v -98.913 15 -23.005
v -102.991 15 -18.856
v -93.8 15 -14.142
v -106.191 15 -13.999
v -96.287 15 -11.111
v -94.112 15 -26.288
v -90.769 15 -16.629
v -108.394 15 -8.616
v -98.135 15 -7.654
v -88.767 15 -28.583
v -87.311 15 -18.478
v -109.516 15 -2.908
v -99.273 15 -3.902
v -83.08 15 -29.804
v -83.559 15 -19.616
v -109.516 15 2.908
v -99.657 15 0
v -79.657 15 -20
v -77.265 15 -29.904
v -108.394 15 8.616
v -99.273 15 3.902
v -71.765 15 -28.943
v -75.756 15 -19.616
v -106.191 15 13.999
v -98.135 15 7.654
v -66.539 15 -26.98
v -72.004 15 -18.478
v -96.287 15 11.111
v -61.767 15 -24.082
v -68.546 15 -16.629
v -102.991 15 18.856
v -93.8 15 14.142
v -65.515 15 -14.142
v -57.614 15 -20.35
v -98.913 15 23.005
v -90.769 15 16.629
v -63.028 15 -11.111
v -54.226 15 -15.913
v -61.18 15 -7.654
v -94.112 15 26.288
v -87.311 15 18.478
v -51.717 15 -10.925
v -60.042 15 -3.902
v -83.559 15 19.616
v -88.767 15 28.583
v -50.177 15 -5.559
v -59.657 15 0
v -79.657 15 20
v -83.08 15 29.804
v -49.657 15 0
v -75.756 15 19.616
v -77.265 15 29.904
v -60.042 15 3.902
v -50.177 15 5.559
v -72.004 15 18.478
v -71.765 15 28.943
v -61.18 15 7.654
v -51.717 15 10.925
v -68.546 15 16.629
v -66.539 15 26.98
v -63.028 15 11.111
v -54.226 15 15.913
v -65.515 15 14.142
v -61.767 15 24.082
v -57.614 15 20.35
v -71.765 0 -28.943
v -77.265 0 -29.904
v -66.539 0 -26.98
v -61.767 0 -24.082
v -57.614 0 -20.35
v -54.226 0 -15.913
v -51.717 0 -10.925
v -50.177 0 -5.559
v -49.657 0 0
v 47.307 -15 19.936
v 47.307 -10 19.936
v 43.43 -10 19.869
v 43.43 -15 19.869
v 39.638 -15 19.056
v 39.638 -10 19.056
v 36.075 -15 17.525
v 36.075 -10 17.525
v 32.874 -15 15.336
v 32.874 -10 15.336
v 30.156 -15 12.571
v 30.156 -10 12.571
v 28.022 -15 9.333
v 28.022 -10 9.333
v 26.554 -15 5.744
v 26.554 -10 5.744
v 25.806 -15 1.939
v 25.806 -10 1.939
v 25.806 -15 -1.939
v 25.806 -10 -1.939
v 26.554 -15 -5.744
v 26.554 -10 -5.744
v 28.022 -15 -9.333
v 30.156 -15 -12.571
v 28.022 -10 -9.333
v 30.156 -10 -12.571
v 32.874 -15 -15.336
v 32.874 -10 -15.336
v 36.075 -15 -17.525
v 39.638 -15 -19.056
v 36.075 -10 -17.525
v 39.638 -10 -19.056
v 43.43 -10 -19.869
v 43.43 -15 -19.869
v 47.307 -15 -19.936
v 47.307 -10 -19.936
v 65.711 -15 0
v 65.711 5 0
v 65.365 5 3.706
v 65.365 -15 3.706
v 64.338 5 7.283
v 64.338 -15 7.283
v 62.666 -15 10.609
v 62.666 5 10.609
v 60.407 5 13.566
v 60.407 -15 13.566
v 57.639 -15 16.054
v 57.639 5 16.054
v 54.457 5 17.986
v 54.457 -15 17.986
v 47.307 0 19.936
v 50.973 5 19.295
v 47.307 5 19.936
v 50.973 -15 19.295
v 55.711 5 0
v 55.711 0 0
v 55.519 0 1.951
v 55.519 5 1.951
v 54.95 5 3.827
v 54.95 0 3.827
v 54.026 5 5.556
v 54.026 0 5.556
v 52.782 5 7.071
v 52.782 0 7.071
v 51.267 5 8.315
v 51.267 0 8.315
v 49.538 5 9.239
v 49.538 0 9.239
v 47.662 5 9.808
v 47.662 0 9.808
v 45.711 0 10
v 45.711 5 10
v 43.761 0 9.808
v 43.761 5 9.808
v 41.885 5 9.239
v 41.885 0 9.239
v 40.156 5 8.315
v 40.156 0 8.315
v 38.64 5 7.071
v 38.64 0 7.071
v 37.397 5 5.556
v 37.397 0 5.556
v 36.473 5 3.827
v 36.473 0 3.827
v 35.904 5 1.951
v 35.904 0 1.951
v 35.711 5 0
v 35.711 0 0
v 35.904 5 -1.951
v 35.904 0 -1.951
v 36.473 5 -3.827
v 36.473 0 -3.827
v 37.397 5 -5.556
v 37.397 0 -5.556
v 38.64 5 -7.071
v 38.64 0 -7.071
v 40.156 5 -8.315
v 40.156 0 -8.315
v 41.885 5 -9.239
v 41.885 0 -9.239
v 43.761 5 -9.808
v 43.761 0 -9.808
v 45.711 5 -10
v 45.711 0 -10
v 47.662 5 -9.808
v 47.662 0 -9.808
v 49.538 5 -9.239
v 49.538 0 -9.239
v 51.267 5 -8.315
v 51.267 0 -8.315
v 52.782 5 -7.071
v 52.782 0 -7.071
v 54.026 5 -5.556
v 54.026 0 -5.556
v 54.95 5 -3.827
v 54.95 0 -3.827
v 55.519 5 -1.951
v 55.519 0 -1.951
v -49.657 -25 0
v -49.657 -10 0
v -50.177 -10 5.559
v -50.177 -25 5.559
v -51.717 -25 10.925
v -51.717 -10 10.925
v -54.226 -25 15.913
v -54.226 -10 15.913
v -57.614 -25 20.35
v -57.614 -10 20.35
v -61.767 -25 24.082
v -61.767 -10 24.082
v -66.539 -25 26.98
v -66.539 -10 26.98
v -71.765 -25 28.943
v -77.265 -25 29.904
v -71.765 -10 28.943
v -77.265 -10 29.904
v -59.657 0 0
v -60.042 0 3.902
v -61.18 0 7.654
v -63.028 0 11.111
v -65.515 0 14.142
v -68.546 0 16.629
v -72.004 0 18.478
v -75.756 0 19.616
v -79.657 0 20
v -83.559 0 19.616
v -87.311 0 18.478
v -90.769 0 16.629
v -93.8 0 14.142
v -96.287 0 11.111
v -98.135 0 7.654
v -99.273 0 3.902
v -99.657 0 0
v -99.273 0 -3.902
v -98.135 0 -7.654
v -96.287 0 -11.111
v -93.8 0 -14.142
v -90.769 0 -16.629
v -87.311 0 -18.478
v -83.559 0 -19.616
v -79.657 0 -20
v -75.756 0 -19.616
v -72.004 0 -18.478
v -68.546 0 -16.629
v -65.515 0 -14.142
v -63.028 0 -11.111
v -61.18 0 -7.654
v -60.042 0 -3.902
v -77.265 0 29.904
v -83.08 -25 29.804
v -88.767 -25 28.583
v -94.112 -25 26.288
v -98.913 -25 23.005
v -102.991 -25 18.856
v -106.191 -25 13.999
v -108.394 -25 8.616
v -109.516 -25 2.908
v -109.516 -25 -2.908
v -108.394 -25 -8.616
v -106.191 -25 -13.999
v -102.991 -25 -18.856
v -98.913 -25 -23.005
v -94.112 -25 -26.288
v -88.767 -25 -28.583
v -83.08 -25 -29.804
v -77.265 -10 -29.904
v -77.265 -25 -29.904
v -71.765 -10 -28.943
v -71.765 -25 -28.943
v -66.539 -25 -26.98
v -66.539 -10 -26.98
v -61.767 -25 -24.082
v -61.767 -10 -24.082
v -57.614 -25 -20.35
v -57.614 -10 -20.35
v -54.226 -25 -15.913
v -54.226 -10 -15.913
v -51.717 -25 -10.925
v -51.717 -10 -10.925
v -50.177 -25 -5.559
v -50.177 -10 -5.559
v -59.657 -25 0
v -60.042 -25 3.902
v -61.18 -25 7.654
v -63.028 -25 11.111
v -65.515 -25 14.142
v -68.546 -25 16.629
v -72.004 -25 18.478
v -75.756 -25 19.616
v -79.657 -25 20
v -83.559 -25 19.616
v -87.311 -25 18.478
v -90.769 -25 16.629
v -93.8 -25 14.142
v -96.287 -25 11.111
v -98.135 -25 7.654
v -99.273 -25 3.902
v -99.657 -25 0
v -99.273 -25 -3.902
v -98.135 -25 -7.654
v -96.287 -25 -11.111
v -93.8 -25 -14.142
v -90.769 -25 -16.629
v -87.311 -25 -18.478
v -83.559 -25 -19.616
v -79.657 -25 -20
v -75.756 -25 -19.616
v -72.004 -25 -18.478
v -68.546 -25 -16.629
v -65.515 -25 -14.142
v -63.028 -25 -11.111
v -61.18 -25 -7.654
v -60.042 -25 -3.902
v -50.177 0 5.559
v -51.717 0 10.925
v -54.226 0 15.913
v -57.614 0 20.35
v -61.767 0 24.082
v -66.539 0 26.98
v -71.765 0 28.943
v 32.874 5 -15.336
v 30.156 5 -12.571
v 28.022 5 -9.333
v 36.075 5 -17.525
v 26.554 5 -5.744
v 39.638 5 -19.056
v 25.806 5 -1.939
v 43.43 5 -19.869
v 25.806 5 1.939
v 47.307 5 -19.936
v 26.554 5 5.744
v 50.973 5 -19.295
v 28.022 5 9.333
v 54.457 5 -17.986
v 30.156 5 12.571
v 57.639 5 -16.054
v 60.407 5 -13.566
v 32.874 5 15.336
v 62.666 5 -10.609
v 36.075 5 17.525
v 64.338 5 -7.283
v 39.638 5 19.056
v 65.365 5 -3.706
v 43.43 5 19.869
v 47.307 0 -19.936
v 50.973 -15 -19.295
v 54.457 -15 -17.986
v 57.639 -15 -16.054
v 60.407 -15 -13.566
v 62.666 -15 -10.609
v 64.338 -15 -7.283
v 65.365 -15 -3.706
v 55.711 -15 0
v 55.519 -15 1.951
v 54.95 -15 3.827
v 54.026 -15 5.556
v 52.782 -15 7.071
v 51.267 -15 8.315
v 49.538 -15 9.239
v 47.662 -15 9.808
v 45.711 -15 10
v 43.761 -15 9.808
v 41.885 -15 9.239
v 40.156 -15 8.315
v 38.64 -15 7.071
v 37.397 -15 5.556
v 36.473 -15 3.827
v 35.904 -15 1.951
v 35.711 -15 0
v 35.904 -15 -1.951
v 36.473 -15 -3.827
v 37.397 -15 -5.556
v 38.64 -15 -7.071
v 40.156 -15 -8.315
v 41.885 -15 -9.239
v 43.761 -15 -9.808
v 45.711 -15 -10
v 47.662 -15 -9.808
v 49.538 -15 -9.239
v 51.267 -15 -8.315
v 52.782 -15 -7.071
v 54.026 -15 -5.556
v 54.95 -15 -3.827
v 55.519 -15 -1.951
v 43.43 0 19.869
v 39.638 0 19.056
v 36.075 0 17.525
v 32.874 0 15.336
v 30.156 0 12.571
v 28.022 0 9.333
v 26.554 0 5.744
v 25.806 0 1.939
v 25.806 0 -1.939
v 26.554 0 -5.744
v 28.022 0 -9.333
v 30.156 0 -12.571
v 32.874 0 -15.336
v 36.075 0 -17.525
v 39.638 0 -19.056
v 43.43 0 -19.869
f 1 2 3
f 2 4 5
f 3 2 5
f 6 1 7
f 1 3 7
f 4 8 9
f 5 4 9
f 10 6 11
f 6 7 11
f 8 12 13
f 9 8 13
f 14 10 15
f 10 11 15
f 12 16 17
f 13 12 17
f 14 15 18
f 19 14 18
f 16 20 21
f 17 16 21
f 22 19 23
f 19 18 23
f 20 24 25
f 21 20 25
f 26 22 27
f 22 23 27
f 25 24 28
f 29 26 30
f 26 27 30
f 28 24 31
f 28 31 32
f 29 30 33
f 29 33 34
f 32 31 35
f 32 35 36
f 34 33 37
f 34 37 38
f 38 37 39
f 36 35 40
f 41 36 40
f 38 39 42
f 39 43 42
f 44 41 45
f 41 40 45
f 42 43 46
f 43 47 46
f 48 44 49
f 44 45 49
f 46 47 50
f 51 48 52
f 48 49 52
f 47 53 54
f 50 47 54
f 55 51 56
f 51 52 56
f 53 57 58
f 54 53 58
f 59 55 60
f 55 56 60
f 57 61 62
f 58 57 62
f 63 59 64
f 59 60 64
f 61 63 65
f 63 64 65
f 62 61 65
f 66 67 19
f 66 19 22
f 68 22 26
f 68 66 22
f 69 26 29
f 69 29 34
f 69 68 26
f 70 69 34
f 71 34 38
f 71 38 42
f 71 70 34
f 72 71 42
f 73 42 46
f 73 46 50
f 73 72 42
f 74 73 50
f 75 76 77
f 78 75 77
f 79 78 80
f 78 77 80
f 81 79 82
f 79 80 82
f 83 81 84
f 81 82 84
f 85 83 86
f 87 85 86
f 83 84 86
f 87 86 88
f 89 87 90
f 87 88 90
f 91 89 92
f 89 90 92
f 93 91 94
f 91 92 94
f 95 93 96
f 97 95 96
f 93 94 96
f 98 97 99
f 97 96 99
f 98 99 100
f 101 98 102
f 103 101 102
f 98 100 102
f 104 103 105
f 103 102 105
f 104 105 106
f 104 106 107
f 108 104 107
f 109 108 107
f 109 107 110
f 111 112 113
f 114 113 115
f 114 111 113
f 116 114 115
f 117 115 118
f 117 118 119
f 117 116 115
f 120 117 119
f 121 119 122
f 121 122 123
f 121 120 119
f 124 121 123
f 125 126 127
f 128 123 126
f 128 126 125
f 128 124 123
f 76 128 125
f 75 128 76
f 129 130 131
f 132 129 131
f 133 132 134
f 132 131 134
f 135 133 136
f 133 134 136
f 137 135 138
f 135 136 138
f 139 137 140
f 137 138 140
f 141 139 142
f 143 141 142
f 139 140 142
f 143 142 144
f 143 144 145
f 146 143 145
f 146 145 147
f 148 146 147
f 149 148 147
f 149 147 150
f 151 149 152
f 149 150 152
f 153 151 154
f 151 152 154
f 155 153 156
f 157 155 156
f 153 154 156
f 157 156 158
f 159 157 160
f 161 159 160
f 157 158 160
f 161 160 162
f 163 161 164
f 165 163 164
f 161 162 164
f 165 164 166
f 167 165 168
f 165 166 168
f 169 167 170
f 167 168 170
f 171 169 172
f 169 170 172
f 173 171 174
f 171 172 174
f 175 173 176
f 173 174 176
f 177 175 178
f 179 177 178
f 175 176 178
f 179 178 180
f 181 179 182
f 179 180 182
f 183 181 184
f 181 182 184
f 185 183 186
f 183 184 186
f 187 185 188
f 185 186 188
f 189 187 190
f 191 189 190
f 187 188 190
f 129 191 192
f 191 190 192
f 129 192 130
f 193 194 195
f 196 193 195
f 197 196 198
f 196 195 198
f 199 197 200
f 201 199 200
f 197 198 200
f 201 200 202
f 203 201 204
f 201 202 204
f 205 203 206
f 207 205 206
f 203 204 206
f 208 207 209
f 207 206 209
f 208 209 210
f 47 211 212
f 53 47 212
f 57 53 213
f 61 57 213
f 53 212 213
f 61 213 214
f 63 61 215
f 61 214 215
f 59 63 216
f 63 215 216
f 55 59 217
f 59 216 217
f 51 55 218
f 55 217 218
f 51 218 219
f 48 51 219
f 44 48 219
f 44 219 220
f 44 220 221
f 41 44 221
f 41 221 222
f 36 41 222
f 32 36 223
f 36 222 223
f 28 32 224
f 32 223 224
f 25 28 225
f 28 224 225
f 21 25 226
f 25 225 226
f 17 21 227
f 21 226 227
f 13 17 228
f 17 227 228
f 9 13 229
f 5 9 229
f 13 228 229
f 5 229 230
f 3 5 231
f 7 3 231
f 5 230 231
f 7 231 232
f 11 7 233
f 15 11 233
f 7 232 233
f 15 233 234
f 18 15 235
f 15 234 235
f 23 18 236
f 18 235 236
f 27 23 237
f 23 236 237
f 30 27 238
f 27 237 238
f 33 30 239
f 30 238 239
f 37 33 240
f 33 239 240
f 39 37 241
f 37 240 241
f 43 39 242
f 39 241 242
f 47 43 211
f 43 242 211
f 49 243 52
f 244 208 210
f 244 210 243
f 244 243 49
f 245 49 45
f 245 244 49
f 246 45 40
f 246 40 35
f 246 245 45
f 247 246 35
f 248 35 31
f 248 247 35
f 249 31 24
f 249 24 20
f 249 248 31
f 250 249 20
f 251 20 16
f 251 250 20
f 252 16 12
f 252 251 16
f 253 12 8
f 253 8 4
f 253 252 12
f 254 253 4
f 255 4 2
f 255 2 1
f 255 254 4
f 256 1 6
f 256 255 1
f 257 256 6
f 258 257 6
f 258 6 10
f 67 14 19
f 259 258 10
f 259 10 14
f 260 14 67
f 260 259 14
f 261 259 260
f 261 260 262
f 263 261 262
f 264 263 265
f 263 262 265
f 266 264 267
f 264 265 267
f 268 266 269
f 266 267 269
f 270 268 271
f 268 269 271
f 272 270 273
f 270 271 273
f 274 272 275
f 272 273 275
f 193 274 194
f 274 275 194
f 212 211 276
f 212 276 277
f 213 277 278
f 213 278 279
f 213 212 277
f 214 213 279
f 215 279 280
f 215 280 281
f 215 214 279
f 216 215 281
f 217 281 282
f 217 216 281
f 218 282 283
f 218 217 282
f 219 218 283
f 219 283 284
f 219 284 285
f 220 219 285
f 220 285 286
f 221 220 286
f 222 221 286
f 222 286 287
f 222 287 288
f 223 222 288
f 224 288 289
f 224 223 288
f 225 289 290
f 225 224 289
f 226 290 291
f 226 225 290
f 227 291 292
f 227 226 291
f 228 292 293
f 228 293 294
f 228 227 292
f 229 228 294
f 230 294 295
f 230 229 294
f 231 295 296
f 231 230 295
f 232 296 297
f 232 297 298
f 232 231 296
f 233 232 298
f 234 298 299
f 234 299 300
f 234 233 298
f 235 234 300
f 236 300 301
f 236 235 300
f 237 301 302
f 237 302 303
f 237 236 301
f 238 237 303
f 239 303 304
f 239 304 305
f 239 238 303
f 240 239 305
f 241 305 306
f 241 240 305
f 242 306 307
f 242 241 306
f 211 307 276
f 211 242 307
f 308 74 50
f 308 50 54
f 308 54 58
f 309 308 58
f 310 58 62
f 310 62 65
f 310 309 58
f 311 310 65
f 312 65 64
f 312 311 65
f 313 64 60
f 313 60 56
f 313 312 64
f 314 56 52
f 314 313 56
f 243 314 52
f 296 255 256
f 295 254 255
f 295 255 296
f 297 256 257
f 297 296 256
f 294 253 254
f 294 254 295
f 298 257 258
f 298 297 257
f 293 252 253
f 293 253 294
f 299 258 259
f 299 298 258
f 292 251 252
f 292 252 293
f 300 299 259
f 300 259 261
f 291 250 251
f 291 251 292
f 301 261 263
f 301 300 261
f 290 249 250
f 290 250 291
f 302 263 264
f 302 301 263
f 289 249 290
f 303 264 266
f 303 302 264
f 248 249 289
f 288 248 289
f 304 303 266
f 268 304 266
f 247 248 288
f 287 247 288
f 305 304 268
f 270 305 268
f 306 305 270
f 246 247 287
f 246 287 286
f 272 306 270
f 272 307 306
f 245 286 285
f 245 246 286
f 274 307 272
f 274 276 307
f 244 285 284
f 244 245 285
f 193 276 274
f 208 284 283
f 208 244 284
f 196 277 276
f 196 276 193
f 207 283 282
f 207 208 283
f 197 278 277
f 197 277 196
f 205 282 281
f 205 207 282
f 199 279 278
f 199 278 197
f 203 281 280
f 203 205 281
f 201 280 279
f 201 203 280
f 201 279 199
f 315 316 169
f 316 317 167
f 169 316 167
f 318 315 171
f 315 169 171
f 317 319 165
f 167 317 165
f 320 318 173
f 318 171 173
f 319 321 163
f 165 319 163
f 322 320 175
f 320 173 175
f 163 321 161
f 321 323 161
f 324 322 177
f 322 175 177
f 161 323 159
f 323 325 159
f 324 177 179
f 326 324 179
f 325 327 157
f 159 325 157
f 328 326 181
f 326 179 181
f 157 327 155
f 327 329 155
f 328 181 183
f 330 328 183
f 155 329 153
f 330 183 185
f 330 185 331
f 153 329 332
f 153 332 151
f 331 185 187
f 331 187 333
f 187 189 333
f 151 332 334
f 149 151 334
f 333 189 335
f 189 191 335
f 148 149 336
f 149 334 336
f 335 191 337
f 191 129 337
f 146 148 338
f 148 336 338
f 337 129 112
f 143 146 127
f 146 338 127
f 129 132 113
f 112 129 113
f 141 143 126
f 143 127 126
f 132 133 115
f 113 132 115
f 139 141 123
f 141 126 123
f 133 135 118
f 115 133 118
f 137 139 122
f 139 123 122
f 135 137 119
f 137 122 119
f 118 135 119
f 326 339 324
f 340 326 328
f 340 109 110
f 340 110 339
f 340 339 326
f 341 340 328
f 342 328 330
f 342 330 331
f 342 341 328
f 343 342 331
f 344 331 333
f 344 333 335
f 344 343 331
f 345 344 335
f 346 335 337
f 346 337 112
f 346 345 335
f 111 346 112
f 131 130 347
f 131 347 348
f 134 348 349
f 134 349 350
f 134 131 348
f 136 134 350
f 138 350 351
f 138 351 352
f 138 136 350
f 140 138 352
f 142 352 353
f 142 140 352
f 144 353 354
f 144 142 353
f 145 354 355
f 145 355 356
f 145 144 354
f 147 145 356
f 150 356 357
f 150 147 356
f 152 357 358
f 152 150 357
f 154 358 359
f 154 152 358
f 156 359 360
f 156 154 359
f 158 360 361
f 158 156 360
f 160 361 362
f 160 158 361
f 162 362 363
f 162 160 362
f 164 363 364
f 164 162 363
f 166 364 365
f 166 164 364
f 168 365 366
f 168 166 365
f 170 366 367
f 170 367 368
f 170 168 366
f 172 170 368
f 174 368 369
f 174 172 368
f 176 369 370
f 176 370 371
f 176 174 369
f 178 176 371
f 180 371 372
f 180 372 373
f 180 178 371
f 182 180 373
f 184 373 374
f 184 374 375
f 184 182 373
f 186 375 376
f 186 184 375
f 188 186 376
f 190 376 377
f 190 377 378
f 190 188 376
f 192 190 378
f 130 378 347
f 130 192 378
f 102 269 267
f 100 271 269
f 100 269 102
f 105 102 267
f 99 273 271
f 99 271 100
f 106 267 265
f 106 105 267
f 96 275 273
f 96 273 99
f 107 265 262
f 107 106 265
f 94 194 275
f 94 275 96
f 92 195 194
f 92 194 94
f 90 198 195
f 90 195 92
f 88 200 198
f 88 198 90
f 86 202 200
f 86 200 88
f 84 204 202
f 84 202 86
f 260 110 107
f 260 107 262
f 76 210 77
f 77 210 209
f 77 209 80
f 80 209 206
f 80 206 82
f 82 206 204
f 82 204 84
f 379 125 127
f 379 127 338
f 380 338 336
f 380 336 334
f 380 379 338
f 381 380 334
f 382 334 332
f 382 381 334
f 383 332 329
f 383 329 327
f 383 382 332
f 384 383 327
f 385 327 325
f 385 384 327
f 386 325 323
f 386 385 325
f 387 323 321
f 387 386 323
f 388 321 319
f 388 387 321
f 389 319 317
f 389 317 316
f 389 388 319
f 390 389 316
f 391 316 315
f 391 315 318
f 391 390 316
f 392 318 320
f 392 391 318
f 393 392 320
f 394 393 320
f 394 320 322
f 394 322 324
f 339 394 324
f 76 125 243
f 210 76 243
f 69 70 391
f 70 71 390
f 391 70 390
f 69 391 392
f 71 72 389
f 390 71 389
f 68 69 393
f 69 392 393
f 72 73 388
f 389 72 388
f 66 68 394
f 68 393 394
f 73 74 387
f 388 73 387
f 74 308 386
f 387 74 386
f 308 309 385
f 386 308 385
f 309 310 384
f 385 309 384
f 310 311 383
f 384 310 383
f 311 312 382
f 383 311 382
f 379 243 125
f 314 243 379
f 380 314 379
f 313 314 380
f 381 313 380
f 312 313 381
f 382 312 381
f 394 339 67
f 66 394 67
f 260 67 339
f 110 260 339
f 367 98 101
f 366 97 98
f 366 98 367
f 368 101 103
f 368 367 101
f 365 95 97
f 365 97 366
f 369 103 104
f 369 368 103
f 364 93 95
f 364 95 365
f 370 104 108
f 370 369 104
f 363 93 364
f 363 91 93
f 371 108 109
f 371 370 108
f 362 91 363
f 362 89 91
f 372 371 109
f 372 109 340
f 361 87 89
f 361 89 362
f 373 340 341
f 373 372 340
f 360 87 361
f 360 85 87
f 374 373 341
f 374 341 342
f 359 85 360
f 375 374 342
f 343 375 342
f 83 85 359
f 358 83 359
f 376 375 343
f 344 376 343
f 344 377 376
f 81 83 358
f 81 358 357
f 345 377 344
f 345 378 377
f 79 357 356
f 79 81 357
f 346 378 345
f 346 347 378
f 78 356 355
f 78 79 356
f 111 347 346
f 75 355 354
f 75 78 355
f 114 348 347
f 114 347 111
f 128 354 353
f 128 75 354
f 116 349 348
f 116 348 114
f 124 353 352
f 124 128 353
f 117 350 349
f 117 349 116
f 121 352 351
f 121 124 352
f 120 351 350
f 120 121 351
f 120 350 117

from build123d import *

# Parameters (mm, degrees)
F1_DEPTH = 10
F0_R     = 20
F2_DEPTH = 25
F3_DEPTH = 15
F0_R_2   = 10
F4_DEPTH = 15
F5_DEPTH = 5


with BuildPart() as f1:
    # F0 (on Front) → F1 (new body)
    with BuildSketch(Plane.XZ):
        with BuildLine():
            ThreePointArc((-77.264525, 29.904412), (-57.614458, 20.349593), (-49.657463, 0))
            ThreePointArc((-49.657463, 0), (-57.614458, -20.349593), (-77.264525, -29.904412))
            Line((-77.264525, -29.904412), (47.306721, -19.936275))
            ThreePointArc((47.306721, -19.936275), (25.711429, 0), (47.306721, 19.936275))
            Line((47.306721, 19.936275), (-77.264525, 29.904412))
        make_face()
    extrude(amount=F1_DEPTH)

    # F0 (on Front) → F2 (join)
    with BuildSketch(Plane.XZ):
        with BuildLine():
            ThreePointArc((-77.264525, -29.904412), (-57.614458, -20.349593), (-49.657463, 0))
            ThreePointArc((-49.657463, 0), (-57.614458, 20.349593), (-77.264525, 29.904412))
            ThreePointArc((-77.264525, 29.904412), (-109.657463, 0), (-77.264525, -29.904412))
        make_face()
        with Locations((-79.657463, 0)):
            Circle(F0_R, mode=Mode.SUBTRACT)
    extrude(amount=F2_DEPTH)

    # F0 (on Front) → F3 (join)
    with BuildSketch(Plane.XZ):
        with BuildLine():
            ThreePointArc((-77.264525, -29.904412), (-57.614458, -20.349593), (-49.657463, 0))
            ThreePointArc((-49.657463, 0), (-57.614458, 20.349593), (-77.264525, 29.904412))
            ThreePointArc((-77.264525, 29.904412), (-109.657463, 0), (-77.264525, -29.904412))
        make_face()
        with Locations((-79.657463, 0)):
            Circle(F0_R, mode=Mode.SUBTRACT)
    extrude(amount=-F3_DEPTH)

    # F0 (on Front) → F4 (join)
    with BuildSketch(Plane.XZ):
        with BuildLine():
            ThreePointArc((65.711429, 0), (60.406766, 13.566395), (47.306721, 19.936275))
            ThreePointArc((47.306721, 19.936275), (25.711429, 0), (47.306721, -19.936275))
            ThreePointArc((47.306721, -19.936275), (60.406766, -13.566395), (65.711429, 0))
        make_face()
        with Locations((45.711429, 0)):
            Circle(F0_R_2, mode=Mode.SUBTRACT)
    extrude(amount=F4_DEPTH)

    # F0 (on Front) → F5 (join)
    with BuildSketch(Plane.XZ):
        with BuildLine():
            ThreePointArc((65.711429, 0), (60.406766, 13.566395), (47.306721, 19.936275))
            ThreePointArc((47.306721, 19.936275), (25.711429, 0), (47.306721, -19.936275))
            ThreePointArc((47.306721, -19.936275), (60.406766, -13.566395), (65.711429, 0))
        make_face()
        with Locations((45.711429, 0)):
            Circle(F0_R_2, mode=Mode.SUBTRACT)
    extrude(amount=-F5_DEPTH)


solid = f1.part
